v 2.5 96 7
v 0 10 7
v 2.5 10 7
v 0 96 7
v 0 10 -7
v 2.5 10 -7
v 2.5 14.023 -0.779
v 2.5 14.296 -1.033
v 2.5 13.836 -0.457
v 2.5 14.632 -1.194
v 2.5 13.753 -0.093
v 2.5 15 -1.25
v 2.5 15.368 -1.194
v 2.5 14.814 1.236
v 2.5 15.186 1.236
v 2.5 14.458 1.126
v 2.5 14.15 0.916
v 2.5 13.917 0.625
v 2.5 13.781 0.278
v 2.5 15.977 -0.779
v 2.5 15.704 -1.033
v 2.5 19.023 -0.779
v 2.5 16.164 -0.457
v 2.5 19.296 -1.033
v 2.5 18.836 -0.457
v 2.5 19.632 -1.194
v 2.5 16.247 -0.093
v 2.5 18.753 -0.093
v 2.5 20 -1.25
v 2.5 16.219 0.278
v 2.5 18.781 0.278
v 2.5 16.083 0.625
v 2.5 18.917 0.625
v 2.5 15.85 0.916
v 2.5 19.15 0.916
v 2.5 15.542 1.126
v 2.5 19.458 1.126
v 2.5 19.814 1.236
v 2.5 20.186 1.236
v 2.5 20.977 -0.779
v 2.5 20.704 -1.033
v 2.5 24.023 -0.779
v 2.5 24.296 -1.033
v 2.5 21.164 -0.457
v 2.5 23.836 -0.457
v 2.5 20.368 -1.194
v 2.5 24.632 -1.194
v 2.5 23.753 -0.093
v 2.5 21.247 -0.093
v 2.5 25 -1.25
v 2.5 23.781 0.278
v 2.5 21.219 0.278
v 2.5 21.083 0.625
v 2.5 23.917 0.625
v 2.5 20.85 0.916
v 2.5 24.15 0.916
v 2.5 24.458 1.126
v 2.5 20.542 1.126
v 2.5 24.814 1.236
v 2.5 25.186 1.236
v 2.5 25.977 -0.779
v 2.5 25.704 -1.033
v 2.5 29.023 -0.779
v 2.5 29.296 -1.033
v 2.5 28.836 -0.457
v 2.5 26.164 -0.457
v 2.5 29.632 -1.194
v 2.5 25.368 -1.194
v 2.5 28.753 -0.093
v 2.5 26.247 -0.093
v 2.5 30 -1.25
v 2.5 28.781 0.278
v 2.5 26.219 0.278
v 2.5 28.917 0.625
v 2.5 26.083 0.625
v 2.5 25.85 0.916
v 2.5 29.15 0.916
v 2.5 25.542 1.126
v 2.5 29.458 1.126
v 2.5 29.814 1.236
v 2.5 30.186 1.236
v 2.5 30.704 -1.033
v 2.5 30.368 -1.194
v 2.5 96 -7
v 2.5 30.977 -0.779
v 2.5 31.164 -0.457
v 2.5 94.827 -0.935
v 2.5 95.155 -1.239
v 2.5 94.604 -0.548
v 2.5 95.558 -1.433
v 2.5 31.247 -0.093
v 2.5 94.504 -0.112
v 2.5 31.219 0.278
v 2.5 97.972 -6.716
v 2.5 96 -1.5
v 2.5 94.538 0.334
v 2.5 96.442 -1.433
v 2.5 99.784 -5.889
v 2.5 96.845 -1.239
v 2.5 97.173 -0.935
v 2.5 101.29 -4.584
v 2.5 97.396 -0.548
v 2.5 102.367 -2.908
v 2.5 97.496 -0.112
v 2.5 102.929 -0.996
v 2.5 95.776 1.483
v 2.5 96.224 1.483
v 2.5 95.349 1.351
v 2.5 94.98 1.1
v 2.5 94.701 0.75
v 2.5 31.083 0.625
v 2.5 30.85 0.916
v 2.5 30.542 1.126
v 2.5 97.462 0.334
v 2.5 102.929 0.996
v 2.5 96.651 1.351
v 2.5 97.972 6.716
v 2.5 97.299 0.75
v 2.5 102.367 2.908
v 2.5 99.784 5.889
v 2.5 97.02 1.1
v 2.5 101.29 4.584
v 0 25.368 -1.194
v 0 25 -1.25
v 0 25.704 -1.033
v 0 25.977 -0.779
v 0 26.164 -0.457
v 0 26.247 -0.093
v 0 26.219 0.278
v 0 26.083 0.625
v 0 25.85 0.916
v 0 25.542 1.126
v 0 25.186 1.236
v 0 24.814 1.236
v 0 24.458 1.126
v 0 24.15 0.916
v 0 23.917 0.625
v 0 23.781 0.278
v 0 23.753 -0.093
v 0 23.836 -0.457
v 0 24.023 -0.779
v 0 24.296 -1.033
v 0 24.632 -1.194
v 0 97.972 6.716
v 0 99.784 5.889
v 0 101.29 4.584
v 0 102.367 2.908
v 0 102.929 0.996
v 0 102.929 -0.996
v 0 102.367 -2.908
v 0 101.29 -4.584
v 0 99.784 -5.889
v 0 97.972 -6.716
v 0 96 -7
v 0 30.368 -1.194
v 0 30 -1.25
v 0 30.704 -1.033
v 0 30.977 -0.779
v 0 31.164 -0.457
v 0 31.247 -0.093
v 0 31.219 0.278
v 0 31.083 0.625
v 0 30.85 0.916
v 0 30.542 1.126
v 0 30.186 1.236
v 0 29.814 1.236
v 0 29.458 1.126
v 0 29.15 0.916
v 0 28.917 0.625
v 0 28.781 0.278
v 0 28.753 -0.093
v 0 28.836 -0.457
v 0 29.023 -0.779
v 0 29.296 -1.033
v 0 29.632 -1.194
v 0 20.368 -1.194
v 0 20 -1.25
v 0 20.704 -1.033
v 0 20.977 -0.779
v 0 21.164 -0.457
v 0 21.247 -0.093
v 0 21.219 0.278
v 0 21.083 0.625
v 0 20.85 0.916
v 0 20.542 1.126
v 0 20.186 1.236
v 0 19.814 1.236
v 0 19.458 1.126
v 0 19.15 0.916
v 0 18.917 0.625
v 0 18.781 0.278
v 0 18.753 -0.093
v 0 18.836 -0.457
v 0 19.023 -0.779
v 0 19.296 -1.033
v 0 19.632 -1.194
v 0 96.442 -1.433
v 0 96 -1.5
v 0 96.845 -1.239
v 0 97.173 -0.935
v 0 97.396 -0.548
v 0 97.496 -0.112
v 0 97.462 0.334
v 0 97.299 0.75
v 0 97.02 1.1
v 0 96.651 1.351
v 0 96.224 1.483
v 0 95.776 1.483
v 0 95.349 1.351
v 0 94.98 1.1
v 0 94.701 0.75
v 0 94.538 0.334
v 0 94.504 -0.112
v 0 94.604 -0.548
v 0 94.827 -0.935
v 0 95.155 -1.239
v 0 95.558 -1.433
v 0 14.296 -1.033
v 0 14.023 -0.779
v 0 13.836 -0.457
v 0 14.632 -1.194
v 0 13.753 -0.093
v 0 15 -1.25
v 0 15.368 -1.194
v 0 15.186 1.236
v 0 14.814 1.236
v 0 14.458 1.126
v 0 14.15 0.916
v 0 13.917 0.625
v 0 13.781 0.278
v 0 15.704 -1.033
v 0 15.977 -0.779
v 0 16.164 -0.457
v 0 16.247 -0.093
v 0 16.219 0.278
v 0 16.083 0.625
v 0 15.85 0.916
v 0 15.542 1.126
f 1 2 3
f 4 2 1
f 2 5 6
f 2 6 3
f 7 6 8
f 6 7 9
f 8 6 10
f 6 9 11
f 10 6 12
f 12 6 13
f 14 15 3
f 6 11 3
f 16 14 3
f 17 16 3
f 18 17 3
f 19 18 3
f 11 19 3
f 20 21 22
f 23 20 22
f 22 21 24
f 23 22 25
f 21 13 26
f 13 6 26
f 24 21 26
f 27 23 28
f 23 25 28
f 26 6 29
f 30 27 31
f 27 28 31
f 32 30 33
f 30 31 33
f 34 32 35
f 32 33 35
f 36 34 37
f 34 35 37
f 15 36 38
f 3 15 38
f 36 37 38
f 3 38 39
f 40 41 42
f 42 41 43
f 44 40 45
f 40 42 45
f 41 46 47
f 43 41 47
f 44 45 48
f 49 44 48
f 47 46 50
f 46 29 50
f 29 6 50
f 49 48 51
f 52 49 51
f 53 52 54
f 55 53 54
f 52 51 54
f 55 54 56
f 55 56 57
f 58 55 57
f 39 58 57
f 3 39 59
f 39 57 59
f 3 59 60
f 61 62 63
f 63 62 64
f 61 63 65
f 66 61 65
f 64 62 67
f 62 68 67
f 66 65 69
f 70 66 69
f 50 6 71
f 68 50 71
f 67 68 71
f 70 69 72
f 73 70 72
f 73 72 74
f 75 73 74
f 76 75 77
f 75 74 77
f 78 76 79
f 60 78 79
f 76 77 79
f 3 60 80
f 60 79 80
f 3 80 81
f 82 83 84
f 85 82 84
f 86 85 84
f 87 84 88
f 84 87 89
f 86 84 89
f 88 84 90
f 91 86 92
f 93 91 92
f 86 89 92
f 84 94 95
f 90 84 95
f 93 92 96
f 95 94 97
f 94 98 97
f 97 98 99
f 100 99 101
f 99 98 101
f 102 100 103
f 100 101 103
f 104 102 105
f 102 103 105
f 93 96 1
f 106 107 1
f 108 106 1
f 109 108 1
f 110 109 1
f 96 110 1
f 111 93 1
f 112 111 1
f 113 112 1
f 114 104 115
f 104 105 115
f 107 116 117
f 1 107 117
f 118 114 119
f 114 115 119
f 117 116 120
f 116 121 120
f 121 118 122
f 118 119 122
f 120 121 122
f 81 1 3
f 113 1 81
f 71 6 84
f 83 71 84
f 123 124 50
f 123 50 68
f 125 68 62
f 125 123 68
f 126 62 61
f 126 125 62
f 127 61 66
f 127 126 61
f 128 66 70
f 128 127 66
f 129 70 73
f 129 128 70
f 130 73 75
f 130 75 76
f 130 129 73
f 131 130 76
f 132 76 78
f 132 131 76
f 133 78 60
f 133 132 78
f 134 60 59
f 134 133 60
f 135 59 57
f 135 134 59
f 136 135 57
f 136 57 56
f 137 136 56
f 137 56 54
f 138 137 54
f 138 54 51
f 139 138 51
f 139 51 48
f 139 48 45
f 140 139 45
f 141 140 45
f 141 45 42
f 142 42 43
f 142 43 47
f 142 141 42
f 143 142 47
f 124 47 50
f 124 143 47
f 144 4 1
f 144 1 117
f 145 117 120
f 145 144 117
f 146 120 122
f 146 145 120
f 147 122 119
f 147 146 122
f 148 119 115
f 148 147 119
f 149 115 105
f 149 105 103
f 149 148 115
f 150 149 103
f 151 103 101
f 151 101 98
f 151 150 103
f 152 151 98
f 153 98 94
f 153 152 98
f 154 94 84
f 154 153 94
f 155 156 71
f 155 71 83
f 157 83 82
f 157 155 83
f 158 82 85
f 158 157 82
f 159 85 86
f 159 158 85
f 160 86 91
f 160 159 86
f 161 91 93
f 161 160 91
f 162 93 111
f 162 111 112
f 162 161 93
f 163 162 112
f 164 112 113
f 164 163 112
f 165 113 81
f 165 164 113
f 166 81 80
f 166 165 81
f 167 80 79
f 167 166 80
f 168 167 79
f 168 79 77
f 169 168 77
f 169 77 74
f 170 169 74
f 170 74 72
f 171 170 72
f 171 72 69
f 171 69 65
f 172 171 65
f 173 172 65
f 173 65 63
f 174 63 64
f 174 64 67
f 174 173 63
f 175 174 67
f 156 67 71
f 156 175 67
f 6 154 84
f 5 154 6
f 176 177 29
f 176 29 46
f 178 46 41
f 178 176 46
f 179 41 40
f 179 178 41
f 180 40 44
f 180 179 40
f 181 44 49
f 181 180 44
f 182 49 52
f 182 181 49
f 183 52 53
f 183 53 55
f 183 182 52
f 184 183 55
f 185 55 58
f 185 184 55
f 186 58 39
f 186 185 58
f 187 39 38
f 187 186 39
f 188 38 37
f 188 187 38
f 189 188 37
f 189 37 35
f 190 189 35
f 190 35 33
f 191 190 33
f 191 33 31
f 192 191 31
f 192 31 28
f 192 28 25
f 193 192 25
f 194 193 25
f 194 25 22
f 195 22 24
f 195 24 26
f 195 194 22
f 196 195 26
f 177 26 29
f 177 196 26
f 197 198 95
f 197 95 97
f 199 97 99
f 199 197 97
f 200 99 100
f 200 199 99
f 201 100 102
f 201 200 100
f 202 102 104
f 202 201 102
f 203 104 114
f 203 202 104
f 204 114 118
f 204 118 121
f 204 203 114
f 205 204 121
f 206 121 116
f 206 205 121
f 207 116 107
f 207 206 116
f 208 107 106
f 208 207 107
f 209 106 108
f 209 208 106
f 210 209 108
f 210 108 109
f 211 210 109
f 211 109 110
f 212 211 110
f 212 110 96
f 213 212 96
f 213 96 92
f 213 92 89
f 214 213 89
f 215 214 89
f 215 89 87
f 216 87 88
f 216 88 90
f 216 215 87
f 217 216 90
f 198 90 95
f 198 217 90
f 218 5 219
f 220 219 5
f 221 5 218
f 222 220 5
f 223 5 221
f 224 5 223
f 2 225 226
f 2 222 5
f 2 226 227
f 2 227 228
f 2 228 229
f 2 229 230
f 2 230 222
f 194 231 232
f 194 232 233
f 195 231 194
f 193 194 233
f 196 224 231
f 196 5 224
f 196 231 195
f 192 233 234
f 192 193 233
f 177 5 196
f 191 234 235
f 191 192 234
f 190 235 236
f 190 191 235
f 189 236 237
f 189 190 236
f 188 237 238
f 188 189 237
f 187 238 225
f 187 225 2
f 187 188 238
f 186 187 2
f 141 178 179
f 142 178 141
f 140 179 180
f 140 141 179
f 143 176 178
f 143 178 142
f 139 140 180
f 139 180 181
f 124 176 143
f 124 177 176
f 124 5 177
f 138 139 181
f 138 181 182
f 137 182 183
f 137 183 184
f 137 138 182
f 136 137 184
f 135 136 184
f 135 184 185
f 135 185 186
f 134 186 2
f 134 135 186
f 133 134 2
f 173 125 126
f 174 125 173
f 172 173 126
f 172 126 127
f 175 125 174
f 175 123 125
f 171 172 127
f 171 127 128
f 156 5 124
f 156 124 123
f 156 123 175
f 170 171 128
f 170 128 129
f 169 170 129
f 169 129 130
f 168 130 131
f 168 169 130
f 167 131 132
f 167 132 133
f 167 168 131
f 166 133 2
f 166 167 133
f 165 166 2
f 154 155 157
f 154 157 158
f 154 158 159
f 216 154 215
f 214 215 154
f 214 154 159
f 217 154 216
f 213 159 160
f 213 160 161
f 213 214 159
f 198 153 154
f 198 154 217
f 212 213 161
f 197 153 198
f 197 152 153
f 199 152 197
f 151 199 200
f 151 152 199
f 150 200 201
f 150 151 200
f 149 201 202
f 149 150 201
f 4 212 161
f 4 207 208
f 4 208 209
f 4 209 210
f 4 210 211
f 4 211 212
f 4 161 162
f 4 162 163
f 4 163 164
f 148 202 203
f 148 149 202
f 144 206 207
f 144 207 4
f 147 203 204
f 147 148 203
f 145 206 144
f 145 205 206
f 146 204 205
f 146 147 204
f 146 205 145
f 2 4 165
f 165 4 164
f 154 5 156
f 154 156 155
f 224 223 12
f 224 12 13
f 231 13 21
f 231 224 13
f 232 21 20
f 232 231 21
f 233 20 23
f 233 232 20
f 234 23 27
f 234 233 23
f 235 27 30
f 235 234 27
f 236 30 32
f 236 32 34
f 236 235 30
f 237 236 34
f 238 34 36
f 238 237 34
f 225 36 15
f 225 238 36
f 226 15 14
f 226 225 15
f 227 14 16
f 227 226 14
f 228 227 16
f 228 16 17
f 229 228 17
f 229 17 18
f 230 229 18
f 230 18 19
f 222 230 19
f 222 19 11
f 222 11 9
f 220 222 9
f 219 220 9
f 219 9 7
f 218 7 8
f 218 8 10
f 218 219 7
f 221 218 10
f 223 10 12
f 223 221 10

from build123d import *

# Parameters (mm, degrees)
SKETCH1_R           = 1.5
SKETCH1_R_2         = 1.25
BOSS_EXTRUDE1_DEPTH = 2.5


with BuildPart() as part:
    # Sketch1 → Boss-Extrude1 (new body)
    with BuildSketch(Plane(origin=(0, 0, 0), x_dir=(0, 0, -1), z_dir=(1, 0, 0))):
        with BuildLine():
            Line((-7, 10), (-7, 96))
            ThreePointArc((-7, 96), (0, 103), (7, 96))
            Line((7, 96), (7, 10))
            Line((7, 10), (-7, 10))
        make_face()
        with Locations((0, 96)):
            Circle(SKETCH1_R, mode=Mode.SUBTRACT)
        with Locations((0, 15)):
            Circle(SKETCH1_R_2, mode=Mode.SUBTRACT)
        with Locations((0, 20)):
            Circle(SKETCH1_R_2, mode=Mode.SUBTRACT)
        with Locations((0, 25)):
            Circle(SKETCH1_R_2, mode=Mode.SUBTRACT)
        with Locations((0, 30)):
            Circle(SKETCH1_R_2, mode=Mode.SUBTRACT)
    extrude(amount=BOSS_EXTRUDE1_DEPTH)


solid = part.part
